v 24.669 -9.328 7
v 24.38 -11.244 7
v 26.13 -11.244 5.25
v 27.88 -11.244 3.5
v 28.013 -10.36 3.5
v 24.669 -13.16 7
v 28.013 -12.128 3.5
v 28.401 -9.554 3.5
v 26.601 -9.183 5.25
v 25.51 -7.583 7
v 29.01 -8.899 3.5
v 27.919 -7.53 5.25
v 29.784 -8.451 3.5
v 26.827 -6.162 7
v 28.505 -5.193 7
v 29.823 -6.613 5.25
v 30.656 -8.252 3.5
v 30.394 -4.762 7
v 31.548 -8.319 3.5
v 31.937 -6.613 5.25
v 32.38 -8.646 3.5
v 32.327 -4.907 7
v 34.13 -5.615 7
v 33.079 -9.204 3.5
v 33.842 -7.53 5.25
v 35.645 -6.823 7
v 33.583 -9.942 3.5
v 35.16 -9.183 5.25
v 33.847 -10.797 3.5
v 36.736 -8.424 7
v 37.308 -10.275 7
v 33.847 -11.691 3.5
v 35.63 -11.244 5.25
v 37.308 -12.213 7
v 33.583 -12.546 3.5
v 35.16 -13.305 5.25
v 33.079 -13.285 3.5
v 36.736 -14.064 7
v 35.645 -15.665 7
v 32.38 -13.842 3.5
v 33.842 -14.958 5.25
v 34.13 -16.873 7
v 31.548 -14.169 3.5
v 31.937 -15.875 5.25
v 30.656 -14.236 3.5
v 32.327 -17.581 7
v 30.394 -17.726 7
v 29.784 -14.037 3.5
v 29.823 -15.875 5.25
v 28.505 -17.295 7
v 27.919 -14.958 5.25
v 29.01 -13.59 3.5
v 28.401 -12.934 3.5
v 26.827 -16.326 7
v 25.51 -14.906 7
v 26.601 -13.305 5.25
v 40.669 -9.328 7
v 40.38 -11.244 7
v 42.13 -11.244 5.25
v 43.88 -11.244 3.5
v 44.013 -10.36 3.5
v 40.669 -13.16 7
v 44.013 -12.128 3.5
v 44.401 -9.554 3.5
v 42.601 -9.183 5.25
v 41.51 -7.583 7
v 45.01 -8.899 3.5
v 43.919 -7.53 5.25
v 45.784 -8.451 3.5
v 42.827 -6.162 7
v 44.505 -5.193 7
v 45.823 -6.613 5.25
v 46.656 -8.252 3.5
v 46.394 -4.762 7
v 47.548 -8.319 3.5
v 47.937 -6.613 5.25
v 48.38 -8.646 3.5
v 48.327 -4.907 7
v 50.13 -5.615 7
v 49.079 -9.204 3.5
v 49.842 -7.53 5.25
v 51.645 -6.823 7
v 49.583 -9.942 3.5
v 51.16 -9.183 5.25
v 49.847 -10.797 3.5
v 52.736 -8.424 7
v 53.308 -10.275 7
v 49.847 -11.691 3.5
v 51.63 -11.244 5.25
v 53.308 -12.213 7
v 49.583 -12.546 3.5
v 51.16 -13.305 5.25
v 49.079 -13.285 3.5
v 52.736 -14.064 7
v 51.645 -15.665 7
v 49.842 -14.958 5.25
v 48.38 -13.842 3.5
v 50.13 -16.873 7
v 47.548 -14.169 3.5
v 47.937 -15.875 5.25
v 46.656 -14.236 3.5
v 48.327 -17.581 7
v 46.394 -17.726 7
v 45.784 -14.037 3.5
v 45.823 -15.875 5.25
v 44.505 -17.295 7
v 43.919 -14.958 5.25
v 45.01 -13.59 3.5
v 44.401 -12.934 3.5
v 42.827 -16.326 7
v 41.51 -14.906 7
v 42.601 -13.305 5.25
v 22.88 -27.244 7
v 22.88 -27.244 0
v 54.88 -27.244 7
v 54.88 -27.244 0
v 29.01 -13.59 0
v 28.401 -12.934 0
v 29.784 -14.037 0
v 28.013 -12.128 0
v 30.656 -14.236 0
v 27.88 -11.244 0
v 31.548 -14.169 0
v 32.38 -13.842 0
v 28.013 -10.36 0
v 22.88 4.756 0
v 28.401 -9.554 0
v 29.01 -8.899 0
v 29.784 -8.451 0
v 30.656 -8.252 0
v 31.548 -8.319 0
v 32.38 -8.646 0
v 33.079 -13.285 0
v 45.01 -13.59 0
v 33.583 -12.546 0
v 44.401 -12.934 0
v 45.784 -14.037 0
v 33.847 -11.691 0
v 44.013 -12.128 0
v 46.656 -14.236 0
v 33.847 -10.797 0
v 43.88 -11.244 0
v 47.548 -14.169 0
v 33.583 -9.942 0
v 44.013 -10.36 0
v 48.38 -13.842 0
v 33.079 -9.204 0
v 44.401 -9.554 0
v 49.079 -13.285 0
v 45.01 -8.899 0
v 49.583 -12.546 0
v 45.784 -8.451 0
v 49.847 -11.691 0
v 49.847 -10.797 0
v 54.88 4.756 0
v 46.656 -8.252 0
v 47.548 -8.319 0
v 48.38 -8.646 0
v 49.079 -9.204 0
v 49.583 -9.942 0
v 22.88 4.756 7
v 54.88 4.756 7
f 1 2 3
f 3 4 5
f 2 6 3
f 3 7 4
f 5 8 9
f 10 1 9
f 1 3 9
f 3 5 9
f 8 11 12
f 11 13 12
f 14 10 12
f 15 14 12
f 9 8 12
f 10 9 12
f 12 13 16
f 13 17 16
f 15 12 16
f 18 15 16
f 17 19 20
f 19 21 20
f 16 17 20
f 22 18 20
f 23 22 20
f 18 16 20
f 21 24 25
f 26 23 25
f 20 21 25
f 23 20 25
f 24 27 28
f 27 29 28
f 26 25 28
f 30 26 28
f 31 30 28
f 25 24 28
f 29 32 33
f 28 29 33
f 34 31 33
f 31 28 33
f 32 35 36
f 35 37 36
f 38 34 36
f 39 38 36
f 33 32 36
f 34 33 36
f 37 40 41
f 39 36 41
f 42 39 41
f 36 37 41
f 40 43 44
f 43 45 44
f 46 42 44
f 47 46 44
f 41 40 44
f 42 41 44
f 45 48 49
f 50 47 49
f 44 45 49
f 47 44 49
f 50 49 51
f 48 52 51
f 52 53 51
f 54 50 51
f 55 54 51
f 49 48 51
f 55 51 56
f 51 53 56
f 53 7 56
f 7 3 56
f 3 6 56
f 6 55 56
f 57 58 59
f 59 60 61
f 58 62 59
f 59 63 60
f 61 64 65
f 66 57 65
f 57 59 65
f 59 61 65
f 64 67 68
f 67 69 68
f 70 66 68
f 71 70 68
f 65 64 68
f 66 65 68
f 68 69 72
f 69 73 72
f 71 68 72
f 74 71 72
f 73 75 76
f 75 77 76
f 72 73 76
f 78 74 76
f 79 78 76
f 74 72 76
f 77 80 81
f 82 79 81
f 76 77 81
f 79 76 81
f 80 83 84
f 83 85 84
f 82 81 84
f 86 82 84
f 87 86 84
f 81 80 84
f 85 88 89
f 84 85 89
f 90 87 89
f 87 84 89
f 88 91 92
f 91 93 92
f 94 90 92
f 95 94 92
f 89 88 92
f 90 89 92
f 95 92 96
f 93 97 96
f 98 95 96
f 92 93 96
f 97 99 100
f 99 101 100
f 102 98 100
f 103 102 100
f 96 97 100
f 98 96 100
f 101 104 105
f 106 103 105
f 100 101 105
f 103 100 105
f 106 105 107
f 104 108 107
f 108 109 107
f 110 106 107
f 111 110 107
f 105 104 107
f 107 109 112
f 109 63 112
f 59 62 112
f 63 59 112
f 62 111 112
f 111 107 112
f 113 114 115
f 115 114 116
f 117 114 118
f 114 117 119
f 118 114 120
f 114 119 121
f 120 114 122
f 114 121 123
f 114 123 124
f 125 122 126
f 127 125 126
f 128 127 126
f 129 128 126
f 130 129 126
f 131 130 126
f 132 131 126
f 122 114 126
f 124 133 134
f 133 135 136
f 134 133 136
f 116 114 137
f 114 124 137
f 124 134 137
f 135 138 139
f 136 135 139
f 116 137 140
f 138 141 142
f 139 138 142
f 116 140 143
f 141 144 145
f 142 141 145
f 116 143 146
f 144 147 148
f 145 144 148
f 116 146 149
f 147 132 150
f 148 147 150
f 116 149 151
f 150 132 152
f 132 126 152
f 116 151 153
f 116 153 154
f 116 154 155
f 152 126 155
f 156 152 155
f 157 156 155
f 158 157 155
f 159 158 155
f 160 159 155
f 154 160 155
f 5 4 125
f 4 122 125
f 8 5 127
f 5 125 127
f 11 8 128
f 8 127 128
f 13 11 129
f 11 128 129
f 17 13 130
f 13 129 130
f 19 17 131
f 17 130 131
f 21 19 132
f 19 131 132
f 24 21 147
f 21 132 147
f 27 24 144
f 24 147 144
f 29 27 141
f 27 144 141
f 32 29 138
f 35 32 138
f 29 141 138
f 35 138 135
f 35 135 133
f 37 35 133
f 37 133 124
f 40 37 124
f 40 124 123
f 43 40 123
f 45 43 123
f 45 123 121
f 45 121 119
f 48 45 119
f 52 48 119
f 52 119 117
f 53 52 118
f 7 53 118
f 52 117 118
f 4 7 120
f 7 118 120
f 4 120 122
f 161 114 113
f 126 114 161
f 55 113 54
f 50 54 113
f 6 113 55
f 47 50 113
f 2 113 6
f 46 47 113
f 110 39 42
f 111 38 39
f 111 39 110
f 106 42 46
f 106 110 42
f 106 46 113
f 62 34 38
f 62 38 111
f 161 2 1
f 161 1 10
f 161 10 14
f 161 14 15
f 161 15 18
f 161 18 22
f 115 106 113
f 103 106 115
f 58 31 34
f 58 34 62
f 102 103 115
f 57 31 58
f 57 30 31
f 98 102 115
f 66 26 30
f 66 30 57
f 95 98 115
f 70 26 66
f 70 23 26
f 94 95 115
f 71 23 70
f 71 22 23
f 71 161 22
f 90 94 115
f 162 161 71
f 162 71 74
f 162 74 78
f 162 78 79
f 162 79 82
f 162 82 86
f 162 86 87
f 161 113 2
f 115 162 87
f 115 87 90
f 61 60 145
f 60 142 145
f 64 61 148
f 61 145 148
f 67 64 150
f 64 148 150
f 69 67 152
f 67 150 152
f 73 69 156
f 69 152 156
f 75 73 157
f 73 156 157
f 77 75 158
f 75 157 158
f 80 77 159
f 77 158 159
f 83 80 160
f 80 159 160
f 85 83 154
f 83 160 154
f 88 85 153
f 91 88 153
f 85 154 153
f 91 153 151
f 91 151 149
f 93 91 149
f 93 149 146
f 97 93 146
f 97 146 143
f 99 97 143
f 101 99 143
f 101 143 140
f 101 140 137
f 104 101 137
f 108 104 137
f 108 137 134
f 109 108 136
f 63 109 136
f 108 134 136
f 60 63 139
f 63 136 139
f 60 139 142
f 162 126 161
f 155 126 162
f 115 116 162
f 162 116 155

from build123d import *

# Parameters (mm, degrees)
SKETCH1_W                                           = 32
SKETCH1_H                                           = 32
BOSS_EXTRUDE1_DEPTH                                 = 7
CSK_FOR_M6_COUNTERSUNK_FLAT_HEAD_SCREW2_D           = 6
CSK_FOR_M6_COUNTERSUNK_FLAT_HEAD_SCREW2_DEPTH       = 23
CSK_FOR_M6_COUNTERSUNK_FLAT_HEAD_SCREW2_CSINK_D     = 13
CSK_FOR_M6_COUNTERSUNK_FLAT_HEAD_SCREW2_CSINK_ANGLE = 90
CSK_FOR_M6_COUNTERSUNK_FLAT_HEAD_SCREW2_TIP         = 1.802581857


with BuildPart() as part:
    # Sketch1 → Boss-Extrude1 (new body)
    with BuildSketch(Plane.XY):
        with Locations((38.880175665, -11.244087205)):
            Rectangle(SKETCH1_W, SKETCH1_H)
    extrude(amount=BOSS_EXTRUDE1_DEPTH)

    # CSK for M6 Countersunk Flat Head Screw2
    with Locations(Plane.XY.offset(7)):
        with Locations((30.880175665, -11.244087205), (46.880175665, -11.244087205)):
            CounterSinkHole(CSK_FOR_M6_COUNTERSUNK_FLAT_HEAD_SCREW2_D / 2, CSK_FOR_M6_COUNTERSUNK_FLAT_HEAD_SCREW2_CSINK_D / 2, depth=CSK_FOR_M6_COUNTERSUNK_FLAT_HEAD_SCREW2_DEPTH, counter_sink_angle=CSK_FOR_M6_COUNTERSUNK_FLAT_HEAD_SCREW2_CSINK_ANGLE)
            with Locations((0, 0, -(CSK_FOR_M6_COUNTERSUNK_FLAT_HEAD_SCREW2_DEPTH + CSK_FOR_M6_COUNTERSUNK_FLAT_HEAD_SCREW2_TIP / 2))):  # 118° drill point
                Cone(0, CSK_FOR_M6_COUNTERSUNK_FLAT_HEAD_SCREW2_D / 2, CSK_FOR_M6_COUNTERSUNK_FLAT_HEAD_SCREW2_TIP, mode=Mode.SUBTRACT)


solid = part.part
